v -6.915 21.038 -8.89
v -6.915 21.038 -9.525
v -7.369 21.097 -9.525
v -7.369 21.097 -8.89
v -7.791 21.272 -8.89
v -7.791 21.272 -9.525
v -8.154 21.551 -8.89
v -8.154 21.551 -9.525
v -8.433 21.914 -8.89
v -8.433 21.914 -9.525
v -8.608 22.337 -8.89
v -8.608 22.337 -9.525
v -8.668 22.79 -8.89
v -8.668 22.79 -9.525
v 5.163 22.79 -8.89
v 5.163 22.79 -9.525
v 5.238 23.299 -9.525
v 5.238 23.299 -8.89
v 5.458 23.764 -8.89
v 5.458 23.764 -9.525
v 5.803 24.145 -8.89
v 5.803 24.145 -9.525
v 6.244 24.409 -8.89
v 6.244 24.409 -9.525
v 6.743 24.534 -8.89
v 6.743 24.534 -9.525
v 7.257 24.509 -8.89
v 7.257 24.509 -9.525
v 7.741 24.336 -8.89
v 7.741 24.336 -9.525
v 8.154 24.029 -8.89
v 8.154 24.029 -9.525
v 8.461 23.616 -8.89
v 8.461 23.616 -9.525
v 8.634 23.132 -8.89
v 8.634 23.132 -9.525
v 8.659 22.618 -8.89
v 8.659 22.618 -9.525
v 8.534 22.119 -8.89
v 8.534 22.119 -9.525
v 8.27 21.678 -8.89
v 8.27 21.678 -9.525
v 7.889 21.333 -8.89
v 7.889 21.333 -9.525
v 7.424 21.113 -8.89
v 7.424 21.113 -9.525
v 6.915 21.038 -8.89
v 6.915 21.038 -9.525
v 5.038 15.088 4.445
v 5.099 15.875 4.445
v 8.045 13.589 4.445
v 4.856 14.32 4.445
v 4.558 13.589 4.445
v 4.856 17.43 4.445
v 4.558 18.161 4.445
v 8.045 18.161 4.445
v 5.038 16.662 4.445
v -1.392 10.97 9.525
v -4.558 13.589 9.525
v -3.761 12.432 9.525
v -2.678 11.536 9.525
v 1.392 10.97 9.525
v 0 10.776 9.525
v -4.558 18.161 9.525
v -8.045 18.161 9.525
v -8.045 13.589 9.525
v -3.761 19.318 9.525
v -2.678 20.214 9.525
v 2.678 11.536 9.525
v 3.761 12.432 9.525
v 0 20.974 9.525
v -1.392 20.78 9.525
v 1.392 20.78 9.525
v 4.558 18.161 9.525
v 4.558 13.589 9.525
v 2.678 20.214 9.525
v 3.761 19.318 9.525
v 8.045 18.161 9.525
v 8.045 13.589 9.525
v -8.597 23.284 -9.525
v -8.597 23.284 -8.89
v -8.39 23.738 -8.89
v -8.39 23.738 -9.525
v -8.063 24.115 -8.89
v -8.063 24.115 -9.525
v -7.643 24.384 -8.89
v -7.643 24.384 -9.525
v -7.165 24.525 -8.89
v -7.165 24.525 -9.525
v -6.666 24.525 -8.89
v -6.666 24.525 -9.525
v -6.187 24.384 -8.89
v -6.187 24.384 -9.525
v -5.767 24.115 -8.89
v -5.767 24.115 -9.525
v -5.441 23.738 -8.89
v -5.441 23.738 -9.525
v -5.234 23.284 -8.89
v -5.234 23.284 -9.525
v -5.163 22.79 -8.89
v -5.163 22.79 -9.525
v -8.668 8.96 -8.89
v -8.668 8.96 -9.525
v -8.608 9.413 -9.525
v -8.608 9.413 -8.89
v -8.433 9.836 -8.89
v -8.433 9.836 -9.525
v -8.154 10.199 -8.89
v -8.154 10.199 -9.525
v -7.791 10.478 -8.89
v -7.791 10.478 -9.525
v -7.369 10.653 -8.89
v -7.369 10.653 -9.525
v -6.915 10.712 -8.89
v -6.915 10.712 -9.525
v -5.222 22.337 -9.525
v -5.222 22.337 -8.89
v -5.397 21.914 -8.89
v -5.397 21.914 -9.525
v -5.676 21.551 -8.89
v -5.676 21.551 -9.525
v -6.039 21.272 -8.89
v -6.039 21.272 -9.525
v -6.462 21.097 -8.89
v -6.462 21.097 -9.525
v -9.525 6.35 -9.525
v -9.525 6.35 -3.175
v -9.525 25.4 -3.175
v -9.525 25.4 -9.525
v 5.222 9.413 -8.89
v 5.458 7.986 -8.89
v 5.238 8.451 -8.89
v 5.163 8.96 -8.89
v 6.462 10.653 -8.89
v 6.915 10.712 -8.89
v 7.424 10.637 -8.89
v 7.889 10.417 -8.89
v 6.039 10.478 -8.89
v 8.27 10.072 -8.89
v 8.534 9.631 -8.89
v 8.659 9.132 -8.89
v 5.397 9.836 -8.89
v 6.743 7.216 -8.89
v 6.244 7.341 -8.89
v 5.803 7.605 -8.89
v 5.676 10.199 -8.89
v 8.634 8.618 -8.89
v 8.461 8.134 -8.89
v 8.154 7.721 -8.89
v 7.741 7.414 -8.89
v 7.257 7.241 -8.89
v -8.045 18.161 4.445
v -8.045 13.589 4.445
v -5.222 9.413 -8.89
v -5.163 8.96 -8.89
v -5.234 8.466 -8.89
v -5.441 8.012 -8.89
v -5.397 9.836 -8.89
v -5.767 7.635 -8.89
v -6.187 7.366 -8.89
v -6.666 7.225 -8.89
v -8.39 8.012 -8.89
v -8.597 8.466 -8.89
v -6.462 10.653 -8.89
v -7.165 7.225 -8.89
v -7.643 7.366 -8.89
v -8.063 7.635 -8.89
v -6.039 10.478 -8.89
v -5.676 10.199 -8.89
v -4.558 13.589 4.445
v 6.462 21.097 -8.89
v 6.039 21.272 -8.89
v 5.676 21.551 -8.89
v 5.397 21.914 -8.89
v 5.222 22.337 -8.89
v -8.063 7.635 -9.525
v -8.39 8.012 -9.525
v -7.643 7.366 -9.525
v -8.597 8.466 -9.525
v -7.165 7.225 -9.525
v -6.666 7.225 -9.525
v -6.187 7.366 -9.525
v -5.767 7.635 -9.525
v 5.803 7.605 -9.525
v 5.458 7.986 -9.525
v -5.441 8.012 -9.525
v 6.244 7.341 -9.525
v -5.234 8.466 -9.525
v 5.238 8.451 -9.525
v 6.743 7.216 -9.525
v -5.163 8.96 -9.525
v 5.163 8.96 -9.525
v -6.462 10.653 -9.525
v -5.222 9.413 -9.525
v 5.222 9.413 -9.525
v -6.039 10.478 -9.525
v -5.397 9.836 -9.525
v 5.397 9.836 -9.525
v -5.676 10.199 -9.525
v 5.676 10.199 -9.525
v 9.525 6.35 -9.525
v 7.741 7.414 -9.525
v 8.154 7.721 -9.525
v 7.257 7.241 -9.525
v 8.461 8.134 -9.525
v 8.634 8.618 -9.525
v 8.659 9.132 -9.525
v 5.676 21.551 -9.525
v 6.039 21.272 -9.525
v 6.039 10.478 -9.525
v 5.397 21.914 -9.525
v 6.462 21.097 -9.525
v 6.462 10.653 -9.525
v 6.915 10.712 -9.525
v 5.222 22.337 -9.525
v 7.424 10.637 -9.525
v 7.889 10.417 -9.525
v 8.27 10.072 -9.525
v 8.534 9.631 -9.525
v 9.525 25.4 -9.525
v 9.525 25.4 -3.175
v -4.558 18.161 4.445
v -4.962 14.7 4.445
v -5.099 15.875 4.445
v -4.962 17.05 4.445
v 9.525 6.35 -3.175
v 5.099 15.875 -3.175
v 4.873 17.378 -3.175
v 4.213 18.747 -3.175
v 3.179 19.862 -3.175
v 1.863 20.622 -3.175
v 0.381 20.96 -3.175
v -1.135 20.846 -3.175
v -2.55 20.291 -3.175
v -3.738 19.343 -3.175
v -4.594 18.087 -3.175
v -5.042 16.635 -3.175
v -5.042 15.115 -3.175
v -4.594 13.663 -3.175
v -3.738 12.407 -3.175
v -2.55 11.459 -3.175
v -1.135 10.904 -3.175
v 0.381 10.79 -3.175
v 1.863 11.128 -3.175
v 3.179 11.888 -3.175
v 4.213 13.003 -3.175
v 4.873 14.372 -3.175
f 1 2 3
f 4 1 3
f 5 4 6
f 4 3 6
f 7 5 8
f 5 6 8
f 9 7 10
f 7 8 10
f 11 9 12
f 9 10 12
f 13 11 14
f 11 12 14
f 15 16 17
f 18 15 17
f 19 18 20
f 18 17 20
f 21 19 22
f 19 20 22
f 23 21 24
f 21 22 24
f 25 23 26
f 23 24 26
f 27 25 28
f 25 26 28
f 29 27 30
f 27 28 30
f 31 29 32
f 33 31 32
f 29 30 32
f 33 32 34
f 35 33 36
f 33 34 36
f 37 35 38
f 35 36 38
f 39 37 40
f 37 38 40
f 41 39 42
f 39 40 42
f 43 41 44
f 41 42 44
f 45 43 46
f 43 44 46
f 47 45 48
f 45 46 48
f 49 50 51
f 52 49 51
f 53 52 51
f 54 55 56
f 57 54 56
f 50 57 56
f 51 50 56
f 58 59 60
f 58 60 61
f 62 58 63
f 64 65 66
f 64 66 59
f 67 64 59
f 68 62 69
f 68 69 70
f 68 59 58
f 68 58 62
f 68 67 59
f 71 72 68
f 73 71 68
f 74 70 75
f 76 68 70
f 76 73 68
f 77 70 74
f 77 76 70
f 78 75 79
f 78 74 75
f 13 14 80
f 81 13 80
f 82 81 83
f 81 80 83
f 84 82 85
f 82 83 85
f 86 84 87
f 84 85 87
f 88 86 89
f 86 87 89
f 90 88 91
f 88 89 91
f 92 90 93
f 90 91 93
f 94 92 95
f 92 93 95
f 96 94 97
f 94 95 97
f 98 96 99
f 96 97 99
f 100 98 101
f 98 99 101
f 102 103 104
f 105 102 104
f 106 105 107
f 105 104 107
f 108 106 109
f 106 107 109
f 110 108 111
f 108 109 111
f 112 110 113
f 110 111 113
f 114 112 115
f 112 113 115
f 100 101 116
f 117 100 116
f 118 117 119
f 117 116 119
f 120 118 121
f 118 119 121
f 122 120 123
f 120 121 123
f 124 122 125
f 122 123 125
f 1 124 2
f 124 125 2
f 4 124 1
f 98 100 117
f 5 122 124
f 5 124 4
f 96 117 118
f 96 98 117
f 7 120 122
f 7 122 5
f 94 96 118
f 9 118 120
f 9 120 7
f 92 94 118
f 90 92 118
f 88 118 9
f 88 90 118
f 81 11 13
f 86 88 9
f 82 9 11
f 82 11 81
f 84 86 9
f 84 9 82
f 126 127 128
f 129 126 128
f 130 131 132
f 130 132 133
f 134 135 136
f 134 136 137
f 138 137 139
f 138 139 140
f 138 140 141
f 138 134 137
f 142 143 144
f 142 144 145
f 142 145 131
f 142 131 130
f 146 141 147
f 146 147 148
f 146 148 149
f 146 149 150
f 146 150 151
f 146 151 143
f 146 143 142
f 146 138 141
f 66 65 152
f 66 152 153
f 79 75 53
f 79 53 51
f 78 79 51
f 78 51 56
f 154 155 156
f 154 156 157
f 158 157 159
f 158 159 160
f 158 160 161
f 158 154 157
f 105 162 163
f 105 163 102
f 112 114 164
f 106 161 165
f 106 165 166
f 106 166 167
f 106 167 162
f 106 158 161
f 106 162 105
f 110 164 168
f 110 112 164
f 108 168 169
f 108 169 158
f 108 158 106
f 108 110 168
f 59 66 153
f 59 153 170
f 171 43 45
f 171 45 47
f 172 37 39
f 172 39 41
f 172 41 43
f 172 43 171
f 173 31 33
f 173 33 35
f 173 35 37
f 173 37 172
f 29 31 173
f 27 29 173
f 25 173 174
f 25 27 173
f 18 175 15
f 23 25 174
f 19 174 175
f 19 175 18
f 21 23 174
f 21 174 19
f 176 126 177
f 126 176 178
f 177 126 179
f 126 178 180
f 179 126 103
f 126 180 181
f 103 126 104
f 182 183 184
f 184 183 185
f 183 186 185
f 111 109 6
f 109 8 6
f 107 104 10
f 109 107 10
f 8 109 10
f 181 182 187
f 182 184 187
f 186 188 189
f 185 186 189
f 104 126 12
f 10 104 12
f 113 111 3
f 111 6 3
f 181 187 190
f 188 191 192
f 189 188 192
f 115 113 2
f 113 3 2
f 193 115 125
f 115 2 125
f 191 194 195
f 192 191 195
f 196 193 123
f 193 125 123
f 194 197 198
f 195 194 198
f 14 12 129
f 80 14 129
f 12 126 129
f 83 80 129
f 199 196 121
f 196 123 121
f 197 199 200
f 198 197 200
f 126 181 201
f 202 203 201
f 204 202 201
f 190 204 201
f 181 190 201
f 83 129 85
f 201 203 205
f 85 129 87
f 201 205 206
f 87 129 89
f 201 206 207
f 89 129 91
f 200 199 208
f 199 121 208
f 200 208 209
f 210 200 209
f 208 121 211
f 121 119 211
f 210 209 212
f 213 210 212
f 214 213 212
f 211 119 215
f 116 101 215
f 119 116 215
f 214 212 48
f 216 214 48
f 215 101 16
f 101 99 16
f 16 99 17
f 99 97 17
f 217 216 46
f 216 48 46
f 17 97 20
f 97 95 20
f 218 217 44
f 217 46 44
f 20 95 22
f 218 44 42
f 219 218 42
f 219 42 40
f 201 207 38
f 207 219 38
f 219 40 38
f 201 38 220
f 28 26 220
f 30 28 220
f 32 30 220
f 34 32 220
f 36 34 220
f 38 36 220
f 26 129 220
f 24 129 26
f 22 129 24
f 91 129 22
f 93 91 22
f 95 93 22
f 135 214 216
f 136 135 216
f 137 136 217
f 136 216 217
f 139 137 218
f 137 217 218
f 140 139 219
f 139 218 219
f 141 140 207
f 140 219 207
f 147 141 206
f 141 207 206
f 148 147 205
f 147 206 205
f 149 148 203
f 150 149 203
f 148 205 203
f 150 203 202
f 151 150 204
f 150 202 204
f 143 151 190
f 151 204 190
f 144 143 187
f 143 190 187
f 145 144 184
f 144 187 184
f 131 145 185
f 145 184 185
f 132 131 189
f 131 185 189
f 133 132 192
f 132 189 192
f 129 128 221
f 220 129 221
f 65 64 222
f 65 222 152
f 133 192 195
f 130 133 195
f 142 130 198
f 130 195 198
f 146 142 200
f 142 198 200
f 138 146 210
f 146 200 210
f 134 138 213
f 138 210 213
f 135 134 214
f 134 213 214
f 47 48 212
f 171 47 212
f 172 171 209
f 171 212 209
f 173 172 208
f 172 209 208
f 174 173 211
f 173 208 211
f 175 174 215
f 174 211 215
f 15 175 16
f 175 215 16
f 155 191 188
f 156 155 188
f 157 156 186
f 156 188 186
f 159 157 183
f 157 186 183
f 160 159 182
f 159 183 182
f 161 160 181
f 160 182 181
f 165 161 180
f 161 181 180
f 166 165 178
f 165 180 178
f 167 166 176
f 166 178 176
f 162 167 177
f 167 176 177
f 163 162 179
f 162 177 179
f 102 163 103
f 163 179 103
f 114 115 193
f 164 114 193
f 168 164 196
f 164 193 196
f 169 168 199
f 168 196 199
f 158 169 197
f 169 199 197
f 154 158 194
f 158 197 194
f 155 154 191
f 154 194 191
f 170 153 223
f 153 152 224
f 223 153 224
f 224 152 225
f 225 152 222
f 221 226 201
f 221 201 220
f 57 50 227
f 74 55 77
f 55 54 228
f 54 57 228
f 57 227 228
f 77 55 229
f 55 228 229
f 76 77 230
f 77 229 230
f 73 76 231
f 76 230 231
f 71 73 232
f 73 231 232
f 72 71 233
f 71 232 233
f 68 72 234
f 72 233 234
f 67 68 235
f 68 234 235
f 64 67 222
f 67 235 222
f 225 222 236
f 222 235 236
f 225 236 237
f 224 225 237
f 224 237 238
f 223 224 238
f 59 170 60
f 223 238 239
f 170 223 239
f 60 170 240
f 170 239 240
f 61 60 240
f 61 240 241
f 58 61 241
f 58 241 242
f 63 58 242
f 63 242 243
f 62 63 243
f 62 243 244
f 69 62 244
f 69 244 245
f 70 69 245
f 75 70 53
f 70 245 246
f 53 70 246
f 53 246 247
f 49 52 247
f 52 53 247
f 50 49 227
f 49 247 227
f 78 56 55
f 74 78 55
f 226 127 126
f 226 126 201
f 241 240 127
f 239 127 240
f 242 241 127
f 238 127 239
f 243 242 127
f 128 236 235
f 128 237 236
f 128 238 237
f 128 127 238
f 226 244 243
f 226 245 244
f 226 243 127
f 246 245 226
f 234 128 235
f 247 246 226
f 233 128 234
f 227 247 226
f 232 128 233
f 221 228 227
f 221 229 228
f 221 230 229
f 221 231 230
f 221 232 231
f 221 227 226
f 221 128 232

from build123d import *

# Parameters (mm, degrees)
F0_R     = 5.09905
F1_DEPTH = 12.7
F3_DEPTH = 5.08
F4_W     = 19.05
F4_H     = 19.05
F5_DEPTH = 6.35
F7_DEPTH = 0.635
F8_ANGLE = -90


with BuildPart() as f1:
    # F0 (on Front) → F1 (new body)
    with BuildSketch(Plane.XZ):
        Circle(F0_R)
    extrude(amount=F1_DEPTH)

    # F2 (on face) → F3 (join)
    with BuildSketch(Plane.XZ.offset(12.7)):
        with BuildLine():
            ThreePointArc((-4.5579068554, -2.286), (-5.09905, 0), (-4.5579068554, 2.286))
            Line((-4.5579068554, 2.286), (-8.04545, 2.286))
            Line((-8.04545, 2.286), (-8.04545, -2.286))
            Line((-8.04545, -2.286), (-4.5579068554, -2.286))
        make_face()
        with BuildLine():
            Line((8.04545, 2.286), (4.5579068554, 2.286))
            ThreePointArc((4.5579068554, 2.286), (4.9619202862, 1.1745884282), (5.09905, 0))
            ThreePointArc((5.09905, 0), (4.9619202862, -1.1745884282), (4.5579068554, -2.286))
            Line((4.5579068554, -2.286), (8.04545, -2.286))
            Line((8.04545, -2.286), (8.04545, 2.286))
        make_face()
    extrude(amount=-F3_DEPTH)

    # F4 (on Front) → F5 (join)
    with BuildSketch(Plane.XZ):
        Rectangle(F4_W, F4_H)
    extrude(amount=-F5_DEPTH)

    # F6 (on face) → F7 (cut)
    with BuildSketch(Plane(origin=(0, 6.35, 0), x_dir=(-1, 0, 0), z_dir=(0, 1, 0))):
        with BuildLine():
            Line((-6.91515, 6.91515), (-5.16255, 6.91515))
            ThreePointArc((-5.16255, 6.91515), (-8.1544253447, 8.1544253447), (-6.91515, 5.16255))
            Line((-6.91515, 5.16255), (-6.91515, 6.91515))
        make_face()
        with BuildLine():
            ThreePointArc((-6.91515, 5.16255), (-5.6758746553, 5.6758746553), (-5.16255, 6.91515))
            Line((-5.16255, 6.91515), (-6.91515, 6.91515))
            Line((-6.91515, 6.91515), (-6.91515, 5.16255))
        make_face()
        with BuildLine():
            ThreePointArc((8.66775, 6.91515), (6.91515, 8.66775), (5.16255, 6.91515))
            Line((5.16255, 6.91515), (6.91515, 6.91515))
            Line((6.91515, 6.91515), (6.91515, 5.16255))
            ThreePointArc((6.91515, 5.16255), (8.1544253447, 5.6758746553), (8.66775, 6.91515))
        make_face()
        with BuildLine():
            Line((6.91515, 6.91515), (5.16255, 6.91515))
            ThreePointArc((5.16255, 6.91515), (5.6758746553, 5.6758746553), (6.91515, 5.16255))
            Line((6.91515, 5.16255), (6.91515, 6.91515))
        make_face()
        with BuildLine():
            Line((6.91515, -6.91515), (6.91515, -5.16255))
            ThreePointArc((6.91515, -5.16255), (5.6758746553, -5.6758746553), (5.16255, -6.91515))
            Line((5.16255, -6.91515), (6.91515, -6.91515))
        make_face()
        with BuildLine():
            ThreePointArc((8.66775, -6.91515), (8.1544253447, -5.6758746553), (6.91515, -5.16255))
            Line((6.91515, -5.16255), (6.91515, -6.91515))
            Line((6.91515, -6.91515), (5.16255, -6.91515))
            ThreePointArc((5.16255, -6.91515), (6.91515, -8.66775), (8.66775, -6.91515))
        make_face()
        with BuildLine():
            ThreePointArc((-5.16255, -6.91515), (-5.6758746553, -5.6758746553), (-6.91515, -5.16255))
            Line((-6.91515, -5.16255), (-6.91515, -6.91515))
            Line((-6.91515, -6.91515), (-5.16255, -6.91515))
        make_face()
        with BuildLine():
            Line((-6.91515, -6.91515), (-6.91515, -5.16255))
            ThreePointArc((-6.91515, -5.16255), (-8.1544253447, -8.1544253447), (-5.16255, -6.91515))
            Line((-5.16255, -6.91515), (-6.91515, -6.91515))
        make_face()
    extrude(amount=-F7_DEPTH, mode=Mode.SUBTRACT)


with BuildPart() as f1_1:
    # F8: moved
    add(f1.part.rotate(Axis((0, 6.35, -9.525), (1, 0, 0)), F8_ANGLE))


solid = f1_1.part
